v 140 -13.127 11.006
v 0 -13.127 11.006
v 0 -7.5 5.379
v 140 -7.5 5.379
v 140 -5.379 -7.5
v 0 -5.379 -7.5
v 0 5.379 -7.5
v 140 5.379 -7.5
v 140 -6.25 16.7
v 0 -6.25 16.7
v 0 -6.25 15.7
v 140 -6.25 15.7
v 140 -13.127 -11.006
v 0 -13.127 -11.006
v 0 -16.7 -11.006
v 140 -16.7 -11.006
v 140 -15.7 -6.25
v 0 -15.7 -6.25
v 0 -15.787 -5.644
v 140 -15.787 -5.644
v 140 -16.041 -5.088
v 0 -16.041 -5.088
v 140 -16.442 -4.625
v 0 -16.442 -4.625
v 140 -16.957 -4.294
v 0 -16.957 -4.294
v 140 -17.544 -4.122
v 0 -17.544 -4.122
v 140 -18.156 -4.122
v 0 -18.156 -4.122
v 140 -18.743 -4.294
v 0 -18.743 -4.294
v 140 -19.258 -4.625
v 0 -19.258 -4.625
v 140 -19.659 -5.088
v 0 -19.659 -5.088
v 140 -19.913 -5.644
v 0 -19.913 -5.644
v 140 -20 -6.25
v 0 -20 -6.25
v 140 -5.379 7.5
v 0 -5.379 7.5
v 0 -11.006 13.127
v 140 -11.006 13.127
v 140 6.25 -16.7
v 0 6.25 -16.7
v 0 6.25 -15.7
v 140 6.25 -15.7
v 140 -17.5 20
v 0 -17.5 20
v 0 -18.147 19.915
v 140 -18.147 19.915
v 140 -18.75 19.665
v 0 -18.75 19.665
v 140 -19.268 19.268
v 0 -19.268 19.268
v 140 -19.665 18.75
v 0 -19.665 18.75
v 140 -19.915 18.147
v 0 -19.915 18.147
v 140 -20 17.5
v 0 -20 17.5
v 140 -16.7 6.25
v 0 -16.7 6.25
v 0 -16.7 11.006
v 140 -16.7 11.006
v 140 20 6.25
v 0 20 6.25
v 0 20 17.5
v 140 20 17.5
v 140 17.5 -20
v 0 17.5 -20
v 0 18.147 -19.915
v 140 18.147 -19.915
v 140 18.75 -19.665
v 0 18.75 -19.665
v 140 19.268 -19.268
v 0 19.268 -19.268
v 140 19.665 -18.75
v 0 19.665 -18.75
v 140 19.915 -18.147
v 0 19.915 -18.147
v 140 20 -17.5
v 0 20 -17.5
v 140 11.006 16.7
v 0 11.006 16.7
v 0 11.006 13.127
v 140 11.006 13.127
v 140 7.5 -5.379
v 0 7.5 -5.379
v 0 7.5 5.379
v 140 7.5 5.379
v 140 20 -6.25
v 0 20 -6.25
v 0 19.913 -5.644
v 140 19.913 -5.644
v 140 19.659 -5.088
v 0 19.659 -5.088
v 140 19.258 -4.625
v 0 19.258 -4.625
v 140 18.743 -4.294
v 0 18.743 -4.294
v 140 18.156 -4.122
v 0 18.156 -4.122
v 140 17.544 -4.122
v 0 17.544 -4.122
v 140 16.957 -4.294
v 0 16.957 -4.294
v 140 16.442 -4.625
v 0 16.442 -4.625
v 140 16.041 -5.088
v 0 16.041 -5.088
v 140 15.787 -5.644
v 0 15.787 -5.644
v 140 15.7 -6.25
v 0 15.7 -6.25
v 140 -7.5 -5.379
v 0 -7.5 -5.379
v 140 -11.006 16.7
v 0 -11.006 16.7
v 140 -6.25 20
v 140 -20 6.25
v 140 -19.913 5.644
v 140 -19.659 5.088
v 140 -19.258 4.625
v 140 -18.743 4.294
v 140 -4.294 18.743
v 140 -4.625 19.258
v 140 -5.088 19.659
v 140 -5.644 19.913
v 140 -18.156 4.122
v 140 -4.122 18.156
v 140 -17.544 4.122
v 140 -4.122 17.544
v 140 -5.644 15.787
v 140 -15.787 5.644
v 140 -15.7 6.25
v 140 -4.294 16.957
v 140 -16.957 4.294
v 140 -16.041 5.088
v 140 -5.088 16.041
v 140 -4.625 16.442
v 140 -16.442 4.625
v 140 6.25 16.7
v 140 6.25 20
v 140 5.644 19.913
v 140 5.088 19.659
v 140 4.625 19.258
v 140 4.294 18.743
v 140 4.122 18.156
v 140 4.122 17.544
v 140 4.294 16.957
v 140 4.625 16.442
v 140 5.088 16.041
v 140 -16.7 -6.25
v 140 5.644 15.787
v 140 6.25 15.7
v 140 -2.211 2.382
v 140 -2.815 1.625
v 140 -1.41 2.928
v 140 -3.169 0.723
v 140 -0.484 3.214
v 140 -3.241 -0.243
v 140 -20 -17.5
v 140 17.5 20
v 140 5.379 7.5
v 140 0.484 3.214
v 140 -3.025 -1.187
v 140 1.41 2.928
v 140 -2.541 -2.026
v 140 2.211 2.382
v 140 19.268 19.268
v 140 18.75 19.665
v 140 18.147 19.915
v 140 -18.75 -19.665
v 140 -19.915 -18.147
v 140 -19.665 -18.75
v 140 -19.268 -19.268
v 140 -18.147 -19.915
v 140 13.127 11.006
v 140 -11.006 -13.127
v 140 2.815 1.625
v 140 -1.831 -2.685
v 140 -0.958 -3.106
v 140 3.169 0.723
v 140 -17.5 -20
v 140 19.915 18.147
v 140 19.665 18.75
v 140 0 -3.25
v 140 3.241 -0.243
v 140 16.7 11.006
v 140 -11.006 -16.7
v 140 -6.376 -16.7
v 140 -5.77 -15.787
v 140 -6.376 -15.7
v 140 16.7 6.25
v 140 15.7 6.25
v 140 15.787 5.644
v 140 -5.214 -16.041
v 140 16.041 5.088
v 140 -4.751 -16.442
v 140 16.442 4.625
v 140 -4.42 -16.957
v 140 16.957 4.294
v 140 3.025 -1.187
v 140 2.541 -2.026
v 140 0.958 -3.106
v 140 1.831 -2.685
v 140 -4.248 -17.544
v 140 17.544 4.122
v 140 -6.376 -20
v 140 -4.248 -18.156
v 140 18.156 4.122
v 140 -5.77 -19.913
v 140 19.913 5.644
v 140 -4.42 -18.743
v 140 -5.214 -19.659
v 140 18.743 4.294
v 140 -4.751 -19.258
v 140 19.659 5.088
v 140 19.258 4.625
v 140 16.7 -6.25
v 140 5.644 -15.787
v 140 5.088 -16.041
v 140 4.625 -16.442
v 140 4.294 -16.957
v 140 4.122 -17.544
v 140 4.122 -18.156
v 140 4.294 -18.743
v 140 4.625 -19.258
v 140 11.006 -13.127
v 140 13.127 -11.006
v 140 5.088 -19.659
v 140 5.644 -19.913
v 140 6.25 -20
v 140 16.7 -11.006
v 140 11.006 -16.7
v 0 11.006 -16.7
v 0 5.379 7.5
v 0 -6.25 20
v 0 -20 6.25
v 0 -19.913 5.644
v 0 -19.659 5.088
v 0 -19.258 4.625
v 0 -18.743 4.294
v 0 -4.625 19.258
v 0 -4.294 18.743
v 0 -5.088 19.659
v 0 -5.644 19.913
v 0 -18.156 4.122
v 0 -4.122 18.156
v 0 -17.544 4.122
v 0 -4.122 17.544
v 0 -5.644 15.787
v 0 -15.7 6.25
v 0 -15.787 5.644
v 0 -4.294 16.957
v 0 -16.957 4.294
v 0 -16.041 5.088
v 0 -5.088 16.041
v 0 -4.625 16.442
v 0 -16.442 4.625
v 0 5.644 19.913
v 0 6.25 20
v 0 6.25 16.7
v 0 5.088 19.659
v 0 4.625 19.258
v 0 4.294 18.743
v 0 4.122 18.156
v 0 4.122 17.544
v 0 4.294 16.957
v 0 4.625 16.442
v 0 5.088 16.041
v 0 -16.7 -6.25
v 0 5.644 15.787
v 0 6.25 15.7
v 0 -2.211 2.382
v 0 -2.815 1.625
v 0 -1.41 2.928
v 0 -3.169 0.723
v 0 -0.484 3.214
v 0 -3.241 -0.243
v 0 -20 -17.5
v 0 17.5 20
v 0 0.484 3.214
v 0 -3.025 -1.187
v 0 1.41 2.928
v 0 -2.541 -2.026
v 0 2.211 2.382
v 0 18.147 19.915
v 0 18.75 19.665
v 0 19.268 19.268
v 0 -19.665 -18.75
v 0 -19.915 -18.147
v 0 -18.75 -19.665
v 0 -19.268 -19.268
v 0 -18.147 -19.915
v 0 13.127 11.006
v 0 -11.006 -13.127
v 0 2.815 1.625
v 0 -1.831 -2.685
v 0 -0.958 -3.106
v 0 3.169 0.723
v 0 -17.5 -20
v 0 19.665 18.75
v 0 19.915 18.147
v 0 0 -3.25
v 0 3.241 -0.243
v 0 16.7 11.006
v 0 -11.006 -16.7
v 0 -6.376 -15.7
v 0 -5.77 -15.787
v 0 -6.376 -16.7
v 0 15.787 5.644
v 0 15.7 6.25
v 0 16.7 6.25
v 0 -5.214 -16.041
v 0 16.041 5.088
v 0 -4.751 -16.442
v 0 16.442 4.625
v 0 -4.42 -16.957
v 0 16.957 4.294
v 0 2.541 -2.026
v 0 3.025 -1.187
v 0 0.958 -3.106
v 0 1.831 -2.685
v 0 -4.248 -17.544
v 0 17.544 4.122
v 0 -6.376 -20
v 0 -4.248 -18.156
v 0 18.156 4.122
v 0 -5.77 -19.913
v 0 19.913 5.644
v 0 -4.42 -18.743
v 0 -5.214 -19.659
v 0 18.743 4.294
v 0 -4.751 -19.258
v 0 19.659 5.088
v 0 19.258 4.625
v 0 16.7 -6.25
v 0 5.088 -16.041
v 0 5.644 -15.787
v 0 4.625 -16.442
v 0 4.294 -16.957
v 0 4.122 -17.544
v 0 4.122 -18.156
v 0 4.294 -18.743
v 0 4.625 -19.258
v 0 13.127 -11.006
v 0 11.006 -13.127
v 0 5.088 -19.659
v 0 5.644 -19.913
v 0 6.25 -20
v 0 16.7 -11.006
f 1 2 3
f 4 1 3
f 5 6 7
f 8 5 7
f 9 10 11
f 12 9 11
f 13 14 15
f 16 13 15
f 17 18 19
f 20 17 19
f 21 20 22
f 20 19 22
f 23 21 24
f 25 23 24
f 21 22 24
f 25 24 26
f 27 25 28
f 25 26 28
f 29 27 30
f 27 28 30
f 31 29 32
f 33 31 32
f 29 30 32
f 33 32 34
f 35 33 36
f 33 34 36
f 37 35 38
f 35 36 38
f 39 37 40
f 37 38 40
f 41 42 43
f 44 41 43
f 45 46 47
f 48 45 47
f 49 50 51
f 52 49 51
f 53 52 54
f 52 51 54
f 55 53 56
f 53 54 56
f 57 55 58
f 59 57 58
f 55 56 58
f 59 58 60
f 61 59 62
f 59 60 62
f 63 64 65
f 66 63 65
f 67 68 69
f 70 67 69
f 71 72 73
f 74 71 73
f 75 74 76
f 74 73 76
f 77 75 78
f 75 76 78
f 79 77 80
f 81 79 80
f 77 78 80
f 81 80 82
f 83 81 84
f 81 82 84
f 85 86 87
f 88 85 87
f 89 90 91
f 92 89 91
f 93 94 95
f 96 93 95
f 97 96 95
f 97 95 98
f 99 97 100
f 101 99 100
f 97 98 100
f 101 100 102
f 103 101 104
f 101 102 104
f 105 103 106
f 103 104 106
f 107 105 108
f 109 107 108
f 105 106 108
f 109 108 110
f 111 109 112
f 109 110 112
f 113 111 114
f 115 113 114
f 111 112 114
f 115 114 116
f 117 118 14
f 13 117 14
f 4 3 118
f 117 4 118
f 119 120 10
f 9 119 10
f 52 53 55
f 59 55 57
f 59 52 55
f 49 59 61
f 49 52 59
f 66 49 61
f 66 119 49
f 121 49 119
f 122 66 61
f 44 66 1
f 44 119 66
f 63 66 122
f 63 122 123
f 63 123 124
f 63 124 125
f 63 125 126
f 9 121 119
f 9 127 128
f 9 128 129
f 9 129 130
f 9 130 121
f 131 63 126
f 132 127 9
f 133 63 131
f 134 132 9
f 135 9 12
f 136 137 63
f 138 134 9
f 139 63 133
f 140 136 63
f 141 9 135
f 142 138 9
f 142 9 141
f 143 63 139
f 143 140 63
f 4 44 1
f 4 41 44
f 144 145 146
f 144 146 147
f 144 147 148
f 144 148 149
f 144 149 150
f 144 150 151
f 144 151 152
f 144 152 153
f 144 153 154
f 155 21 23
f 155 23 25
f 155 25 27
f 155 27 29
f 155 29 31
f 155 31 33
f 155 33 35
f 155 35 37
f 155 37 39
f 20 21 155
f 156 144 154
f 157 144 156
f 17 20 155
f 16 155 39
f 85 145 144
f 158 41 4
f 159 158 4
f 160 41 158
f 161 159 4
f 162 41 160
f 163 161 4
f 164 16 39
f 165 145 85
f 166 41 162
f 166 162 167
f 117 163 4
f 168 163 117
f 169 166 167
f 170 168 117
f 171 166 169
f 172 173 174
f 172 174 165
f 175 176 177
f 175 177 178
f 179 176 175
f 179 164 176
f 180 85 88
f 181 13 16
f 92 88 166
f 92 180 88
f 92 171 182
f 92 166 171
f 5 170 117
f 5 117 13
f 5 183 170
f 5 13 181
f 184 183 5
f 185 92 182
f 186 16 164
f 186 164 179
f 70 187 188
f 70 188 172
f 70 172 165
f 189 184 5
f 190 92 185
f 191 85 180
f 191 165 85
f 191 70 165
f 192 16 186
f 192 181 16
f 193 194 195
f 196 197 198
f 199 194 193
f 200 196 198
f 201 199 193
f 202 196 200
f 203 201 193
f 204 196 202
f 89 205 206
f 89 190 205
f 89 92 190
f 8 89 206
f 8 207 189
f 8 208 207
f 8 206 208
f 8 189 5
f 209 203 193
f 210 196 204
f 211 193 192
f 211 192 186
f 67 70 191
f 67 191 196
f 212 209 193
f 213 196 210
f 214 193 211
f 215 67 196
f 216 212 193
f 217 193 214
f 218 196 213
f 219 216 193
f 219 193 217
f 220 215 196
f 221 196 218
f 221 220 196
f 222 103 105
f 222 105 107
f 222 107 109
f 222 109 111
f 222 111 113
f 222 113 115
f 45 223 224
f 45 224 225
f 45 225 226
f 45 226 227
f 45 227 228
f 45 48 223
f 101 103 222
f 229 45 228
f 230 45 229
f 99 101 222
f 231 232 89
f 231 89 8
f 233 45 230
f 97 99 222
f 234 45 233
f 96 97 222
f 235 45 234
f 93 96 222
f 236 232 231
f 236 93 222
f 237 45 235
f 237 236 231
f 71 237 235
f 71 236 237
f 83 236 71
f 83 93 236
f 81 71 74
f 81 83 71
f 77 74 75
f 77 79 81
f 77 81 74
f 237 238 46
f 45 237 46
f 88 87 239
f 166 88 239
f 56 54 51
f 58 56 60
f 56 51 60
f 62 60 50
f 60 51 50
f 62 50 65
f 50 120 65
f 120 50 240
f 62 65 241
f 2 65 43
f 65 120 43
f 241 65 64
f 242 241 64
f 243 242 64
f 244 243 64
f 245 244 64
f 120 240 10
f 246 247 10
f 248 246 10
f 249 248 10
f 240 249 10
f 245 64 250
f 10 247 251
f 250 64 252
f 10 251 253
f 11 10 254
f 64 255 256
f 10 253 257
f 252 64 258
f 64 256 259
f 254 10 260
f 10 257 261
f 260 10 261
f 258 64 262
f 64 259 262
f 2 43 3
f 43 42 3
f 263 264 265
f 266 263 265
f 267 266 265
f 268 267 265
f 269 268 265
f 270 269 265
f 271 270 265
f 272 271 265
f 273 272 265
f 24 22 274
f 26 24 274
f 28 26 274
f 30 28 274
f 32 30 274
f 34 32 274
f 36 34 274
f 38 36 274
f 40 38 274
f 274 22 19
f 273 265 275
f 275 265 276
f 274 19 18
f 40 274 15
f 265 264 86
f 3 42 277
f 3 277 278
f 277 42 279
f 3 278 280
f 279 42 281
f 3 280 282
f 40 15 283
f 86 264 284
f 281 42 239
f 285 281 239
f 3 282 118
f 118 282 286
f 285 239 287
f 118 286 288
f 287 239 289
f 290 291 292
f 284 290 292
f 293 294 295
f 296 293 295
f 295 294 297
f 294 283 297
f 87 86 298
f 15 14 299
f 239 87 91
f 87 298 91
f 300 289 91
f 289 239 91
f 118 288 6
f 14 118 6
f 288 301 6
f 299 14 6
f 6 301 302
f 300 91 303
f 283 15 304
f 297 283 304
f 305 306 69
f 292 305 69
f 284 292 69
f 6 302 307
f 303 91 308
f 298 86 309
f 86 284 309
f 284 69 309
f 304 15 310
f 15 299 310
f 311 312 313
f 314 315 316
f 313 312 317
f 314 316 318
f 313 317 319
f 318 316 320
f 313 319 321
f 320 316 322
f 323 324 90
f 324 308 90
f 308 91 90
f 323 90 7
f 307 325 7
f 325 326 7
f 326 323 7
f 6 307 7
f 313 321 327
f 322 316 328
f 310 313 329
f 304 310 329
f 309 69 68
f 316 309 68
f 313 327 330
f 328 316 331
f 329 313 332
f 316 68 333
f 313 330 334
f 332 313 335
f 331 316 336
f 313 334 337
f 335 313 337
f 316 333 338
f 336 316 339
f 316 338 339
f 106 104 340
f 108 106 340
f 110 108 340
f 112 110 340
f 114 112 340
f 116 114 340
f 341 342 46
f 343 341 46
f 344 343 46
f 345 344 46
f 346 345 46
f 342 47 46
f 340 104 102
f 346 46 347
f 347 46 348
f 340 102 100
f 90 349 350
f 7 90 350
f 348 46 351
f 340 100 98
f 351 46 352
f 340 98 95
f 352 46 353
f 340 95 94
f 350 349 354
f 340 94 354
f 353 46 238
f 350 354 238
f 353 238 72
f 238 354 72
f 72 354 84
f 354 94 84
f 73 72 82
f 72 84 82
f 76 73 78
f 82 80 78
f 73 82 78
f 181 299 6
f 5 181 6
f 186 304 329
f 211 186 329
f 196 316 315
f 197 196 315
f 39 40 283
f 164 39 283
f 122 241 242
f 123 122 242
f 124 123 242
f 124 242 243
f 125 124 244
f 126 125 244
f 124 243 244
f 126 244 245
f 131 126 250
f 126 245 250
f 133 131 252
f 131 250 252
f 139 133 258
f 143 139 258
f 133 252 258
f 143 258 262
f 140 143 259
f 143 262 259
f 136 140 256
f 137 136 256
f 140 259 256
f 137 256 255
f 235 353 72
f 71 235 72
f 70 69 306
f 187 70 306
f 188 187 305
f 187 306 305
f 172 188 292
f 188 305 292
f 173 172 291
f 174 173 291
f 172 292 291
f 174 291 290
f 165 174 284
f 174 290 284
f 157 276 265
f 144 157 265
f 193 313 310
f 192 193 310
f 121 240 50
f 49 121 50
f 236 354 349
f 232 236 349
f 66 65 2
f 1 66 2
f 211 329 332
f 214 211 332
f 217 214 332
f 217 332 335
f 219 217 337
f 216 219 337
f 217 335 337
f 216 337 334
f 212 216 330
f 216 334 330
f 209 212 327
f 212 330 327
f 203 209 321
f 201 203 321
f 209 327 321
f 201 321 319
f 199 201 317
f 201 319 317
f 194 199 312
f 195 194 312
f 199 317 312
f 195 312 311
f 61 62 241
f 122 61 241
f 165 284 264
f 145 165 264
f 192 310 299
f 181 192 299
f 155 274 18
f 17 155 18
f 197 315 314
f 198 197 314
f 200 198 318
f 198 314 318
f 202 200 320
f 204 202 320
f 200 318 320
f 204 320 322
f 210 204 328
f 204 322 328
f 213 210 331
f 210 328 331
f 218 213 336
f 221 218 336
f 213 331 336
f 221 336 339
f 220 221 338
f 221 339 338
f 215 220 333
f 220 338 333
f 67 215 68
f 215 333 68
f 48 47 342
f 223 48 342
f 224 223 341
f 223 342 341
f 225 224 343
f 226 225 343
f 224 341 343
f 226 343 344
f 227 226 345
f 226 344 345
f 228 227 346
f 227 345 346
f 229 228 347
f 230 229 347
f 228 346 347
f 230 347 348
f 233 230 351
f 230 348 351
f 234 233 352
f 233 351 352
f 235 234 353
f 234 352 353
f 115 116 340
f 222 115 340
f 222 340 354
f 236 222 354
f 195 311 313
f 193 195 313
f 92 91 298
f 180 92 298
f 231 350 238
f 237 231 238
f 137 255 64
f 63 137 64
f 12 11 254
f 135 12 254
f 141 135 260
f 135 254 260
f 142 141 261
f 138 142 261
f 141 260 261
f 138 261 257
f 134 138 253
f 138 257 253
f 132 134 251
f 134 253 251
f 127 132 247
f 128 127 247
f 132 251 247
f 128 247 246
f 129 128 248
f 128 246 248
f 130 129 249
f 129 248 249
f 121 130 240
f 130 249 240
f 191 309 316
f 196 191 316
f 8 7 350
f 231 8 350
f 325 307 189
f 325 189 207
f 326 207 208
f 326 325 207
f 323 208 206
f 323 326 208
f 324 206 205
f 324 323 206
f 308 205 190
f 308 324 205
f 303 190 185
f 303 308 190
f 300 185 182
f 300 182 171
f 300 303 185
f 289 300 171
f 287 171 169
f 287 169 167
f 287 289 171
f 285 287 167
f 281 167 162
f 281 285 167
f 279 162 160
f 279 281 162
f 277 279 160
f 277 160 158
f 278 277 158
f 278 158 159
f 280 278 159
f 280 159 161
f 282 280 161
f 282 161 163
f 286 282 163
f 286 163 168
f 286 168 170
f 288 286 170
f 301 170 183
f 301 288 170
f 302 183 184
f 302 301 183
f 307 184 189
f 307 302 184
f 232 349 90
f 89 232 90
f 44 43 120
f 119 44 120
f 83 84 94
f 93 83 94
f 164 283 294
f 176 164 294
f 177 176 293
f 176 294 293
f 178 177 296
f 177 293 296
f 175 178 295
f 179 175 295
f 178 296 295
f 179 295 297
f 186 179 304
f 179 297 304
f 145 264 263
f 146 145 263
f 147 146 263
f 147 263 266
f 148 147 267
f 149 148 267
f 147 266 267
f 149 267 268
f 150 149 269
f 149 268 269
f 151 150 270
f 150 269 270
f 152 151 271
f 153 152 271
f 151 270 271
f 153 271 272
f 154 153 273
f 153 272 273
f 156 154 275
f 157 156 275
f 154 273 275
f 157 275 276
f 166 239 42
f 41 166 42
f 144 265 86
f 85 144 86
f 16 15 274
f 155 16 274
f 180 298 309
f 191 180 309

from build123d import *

# Parameters (mm, degrees)
SKETCH1_R           = 3.25
BOSS_EXTRUDE1_DEPTH = 140


with BuildPart() as part:
    # Sketch1 → Boss-Extrude1 (new body)
    with BuildSketch(Plane(origin=(0, 0, 0), x_dir=(0, 0, -1), z_dir=(1, 0, 0))):
        with BuildLine():
            Line((-20, 17.5), (-20, 6.25))
            ThreePointArc((-20, 6.25), (-17.85, 4.1), (-15.7, 6.25))
            Line((-15.7, 6.25), (-16.7, 6.25))
            Line((-16.7, 6.25), (-16.7, 11.005533085))
            Line((-16.7, 11.005533085), (-13.126853428, 11.005533085))
            Line((-13.126853428, 11.005533085), (-7.5, 5.378679656))
            Line((-7.5, 5.378679656), (-7.5, -5.378679656))
            Line((-7.5, -5.378679656), (-13.126853428, -11.005533085))
            Line((-13.126853428, -11.005533085), (-16.7, -11.005533085))
            Line((-16.7, -11.005533085), (-16.7, -6.25))
            Line((-16.7, -6.25), (-15.7, -6.25))
            ThreePointArc((-15.7, -6.25), (-17.85, -4.1), (-20, -6.25))
            Line((-20, -6.25), (-20, -17.5))
            ThreePointArc((-20, -17.5), (-19.267766953, -19.267766953), (-17.5, -20))
            Line((-17.5, -20), (-6.25, -20))
            ThreePointArc((-6.25, -20), (-4.1, -17.85), (-6.25, -15.7))
            Line((-6.25, -15.7), (-6.25, -16.7))
            Line((-6.25, -16.7), (-11.005533085, -16.7))
            Line((-11.005533085, -16.7), (-11.005533085, -13.126853428))
            Line((-11.005533085, -13.126853428), (-5.378679656, -7.5))
            Line((-5.378679656, -7.5), (5.378679656, -7.5))
            Line((5.378679656, -7.5), (11.005533085, -13.126853428))
            Line((11.005533085, -13.126853428), (11.005533085, -16.7))
            Line((11.005533085, -16.7), (6.25, -16.7))
            Line((6.25, -16.7), (6.25, -15.7))
            ThreePointArc((6.25, -15.7), (4.1, -17.85), (6.25, -20))
            Line((6.25, -20), (17.5, -20))
            ThreePointArc((17.5, -20), (19.267766953, -19.267766953), (20, -17.5))
            Line((20, -17.5), (20, -6.376005661))
            ThreePointArc((20, -6.376005661), (17.85, -4.226005661), (15.7, -6.376005661))
            Line((15.7, -6.376005661), (16.7, -6.376005661))
            Line((16.7, -6.376005661), (16.7, -11.005533085))
            Line((16.7, -11.005533085), (13.126853428, -11.005533085))
            Line((13.126853428, -11.005533085), (7.5, -5.378679656))
            Line((7.5, -5.378679656), (7.5, 5.378679656))
            Line((7.5, 5.378679656), (13.126853428, 11.005533085))
            Line((13.126853428, 11.005533085), (16.7, 11.005533085))
            Line((16.7, 11.005533085), (16.7, 6.25))
            Line((16.7, 6.25), (15.7, 6.25))
            ThreePointArc((15.7, 6.25), (17.85, 4.1), (20, 6.25))
            Line((20, 6.25), (20, 17.5))
            ThreePointArc((20, 17.5), (19.267766953, 19.267766953), (17.5, 20))
            Line((17.5, 20), (6.25, 20))
            ThreePointArc((6.25, 20), (4.1, 17.85), (6.25, 15.7))
            Line((6.25, 15.7), (6.25, 16.7))
            Line((6.25, 16.7), (11.005533085, 16.7))
            Line((11.005533085, 16.7), (11.005533085, 13.126853428))
            Line((11.005533085, 13.126853428), (5.378679656, 7.5))
            Line((5.378679656, 7.5), (-5.378679656, 7.5))
            Line((-5.378679656, 7.5), (-11.005533085, 13.126853428))
            Line((-11.005533085, 13.126853428), (-11.005533085, 16.7))
            Line((-11.005533085, 16.7), (-6.25, 16.7))
            Line((-6.25, 16.7), (-6.25, 15.7))
            ThreePointArc((-6.25, 15.7), (-4.1, 17.85), (-6.25, 20))
            Line((-6.25, 20), (-17.5, 20))
            ThreePointArc((-17.5, 20), (-19.267766953, 19.267766953), (-20, 17.5))
        make_face()
        Circle(SKETCH1_R, mode=Mode.SUBTRACT)
    extrude(amount=BOSS_EXTRUDE1_DEPTH)


solid = part.part
